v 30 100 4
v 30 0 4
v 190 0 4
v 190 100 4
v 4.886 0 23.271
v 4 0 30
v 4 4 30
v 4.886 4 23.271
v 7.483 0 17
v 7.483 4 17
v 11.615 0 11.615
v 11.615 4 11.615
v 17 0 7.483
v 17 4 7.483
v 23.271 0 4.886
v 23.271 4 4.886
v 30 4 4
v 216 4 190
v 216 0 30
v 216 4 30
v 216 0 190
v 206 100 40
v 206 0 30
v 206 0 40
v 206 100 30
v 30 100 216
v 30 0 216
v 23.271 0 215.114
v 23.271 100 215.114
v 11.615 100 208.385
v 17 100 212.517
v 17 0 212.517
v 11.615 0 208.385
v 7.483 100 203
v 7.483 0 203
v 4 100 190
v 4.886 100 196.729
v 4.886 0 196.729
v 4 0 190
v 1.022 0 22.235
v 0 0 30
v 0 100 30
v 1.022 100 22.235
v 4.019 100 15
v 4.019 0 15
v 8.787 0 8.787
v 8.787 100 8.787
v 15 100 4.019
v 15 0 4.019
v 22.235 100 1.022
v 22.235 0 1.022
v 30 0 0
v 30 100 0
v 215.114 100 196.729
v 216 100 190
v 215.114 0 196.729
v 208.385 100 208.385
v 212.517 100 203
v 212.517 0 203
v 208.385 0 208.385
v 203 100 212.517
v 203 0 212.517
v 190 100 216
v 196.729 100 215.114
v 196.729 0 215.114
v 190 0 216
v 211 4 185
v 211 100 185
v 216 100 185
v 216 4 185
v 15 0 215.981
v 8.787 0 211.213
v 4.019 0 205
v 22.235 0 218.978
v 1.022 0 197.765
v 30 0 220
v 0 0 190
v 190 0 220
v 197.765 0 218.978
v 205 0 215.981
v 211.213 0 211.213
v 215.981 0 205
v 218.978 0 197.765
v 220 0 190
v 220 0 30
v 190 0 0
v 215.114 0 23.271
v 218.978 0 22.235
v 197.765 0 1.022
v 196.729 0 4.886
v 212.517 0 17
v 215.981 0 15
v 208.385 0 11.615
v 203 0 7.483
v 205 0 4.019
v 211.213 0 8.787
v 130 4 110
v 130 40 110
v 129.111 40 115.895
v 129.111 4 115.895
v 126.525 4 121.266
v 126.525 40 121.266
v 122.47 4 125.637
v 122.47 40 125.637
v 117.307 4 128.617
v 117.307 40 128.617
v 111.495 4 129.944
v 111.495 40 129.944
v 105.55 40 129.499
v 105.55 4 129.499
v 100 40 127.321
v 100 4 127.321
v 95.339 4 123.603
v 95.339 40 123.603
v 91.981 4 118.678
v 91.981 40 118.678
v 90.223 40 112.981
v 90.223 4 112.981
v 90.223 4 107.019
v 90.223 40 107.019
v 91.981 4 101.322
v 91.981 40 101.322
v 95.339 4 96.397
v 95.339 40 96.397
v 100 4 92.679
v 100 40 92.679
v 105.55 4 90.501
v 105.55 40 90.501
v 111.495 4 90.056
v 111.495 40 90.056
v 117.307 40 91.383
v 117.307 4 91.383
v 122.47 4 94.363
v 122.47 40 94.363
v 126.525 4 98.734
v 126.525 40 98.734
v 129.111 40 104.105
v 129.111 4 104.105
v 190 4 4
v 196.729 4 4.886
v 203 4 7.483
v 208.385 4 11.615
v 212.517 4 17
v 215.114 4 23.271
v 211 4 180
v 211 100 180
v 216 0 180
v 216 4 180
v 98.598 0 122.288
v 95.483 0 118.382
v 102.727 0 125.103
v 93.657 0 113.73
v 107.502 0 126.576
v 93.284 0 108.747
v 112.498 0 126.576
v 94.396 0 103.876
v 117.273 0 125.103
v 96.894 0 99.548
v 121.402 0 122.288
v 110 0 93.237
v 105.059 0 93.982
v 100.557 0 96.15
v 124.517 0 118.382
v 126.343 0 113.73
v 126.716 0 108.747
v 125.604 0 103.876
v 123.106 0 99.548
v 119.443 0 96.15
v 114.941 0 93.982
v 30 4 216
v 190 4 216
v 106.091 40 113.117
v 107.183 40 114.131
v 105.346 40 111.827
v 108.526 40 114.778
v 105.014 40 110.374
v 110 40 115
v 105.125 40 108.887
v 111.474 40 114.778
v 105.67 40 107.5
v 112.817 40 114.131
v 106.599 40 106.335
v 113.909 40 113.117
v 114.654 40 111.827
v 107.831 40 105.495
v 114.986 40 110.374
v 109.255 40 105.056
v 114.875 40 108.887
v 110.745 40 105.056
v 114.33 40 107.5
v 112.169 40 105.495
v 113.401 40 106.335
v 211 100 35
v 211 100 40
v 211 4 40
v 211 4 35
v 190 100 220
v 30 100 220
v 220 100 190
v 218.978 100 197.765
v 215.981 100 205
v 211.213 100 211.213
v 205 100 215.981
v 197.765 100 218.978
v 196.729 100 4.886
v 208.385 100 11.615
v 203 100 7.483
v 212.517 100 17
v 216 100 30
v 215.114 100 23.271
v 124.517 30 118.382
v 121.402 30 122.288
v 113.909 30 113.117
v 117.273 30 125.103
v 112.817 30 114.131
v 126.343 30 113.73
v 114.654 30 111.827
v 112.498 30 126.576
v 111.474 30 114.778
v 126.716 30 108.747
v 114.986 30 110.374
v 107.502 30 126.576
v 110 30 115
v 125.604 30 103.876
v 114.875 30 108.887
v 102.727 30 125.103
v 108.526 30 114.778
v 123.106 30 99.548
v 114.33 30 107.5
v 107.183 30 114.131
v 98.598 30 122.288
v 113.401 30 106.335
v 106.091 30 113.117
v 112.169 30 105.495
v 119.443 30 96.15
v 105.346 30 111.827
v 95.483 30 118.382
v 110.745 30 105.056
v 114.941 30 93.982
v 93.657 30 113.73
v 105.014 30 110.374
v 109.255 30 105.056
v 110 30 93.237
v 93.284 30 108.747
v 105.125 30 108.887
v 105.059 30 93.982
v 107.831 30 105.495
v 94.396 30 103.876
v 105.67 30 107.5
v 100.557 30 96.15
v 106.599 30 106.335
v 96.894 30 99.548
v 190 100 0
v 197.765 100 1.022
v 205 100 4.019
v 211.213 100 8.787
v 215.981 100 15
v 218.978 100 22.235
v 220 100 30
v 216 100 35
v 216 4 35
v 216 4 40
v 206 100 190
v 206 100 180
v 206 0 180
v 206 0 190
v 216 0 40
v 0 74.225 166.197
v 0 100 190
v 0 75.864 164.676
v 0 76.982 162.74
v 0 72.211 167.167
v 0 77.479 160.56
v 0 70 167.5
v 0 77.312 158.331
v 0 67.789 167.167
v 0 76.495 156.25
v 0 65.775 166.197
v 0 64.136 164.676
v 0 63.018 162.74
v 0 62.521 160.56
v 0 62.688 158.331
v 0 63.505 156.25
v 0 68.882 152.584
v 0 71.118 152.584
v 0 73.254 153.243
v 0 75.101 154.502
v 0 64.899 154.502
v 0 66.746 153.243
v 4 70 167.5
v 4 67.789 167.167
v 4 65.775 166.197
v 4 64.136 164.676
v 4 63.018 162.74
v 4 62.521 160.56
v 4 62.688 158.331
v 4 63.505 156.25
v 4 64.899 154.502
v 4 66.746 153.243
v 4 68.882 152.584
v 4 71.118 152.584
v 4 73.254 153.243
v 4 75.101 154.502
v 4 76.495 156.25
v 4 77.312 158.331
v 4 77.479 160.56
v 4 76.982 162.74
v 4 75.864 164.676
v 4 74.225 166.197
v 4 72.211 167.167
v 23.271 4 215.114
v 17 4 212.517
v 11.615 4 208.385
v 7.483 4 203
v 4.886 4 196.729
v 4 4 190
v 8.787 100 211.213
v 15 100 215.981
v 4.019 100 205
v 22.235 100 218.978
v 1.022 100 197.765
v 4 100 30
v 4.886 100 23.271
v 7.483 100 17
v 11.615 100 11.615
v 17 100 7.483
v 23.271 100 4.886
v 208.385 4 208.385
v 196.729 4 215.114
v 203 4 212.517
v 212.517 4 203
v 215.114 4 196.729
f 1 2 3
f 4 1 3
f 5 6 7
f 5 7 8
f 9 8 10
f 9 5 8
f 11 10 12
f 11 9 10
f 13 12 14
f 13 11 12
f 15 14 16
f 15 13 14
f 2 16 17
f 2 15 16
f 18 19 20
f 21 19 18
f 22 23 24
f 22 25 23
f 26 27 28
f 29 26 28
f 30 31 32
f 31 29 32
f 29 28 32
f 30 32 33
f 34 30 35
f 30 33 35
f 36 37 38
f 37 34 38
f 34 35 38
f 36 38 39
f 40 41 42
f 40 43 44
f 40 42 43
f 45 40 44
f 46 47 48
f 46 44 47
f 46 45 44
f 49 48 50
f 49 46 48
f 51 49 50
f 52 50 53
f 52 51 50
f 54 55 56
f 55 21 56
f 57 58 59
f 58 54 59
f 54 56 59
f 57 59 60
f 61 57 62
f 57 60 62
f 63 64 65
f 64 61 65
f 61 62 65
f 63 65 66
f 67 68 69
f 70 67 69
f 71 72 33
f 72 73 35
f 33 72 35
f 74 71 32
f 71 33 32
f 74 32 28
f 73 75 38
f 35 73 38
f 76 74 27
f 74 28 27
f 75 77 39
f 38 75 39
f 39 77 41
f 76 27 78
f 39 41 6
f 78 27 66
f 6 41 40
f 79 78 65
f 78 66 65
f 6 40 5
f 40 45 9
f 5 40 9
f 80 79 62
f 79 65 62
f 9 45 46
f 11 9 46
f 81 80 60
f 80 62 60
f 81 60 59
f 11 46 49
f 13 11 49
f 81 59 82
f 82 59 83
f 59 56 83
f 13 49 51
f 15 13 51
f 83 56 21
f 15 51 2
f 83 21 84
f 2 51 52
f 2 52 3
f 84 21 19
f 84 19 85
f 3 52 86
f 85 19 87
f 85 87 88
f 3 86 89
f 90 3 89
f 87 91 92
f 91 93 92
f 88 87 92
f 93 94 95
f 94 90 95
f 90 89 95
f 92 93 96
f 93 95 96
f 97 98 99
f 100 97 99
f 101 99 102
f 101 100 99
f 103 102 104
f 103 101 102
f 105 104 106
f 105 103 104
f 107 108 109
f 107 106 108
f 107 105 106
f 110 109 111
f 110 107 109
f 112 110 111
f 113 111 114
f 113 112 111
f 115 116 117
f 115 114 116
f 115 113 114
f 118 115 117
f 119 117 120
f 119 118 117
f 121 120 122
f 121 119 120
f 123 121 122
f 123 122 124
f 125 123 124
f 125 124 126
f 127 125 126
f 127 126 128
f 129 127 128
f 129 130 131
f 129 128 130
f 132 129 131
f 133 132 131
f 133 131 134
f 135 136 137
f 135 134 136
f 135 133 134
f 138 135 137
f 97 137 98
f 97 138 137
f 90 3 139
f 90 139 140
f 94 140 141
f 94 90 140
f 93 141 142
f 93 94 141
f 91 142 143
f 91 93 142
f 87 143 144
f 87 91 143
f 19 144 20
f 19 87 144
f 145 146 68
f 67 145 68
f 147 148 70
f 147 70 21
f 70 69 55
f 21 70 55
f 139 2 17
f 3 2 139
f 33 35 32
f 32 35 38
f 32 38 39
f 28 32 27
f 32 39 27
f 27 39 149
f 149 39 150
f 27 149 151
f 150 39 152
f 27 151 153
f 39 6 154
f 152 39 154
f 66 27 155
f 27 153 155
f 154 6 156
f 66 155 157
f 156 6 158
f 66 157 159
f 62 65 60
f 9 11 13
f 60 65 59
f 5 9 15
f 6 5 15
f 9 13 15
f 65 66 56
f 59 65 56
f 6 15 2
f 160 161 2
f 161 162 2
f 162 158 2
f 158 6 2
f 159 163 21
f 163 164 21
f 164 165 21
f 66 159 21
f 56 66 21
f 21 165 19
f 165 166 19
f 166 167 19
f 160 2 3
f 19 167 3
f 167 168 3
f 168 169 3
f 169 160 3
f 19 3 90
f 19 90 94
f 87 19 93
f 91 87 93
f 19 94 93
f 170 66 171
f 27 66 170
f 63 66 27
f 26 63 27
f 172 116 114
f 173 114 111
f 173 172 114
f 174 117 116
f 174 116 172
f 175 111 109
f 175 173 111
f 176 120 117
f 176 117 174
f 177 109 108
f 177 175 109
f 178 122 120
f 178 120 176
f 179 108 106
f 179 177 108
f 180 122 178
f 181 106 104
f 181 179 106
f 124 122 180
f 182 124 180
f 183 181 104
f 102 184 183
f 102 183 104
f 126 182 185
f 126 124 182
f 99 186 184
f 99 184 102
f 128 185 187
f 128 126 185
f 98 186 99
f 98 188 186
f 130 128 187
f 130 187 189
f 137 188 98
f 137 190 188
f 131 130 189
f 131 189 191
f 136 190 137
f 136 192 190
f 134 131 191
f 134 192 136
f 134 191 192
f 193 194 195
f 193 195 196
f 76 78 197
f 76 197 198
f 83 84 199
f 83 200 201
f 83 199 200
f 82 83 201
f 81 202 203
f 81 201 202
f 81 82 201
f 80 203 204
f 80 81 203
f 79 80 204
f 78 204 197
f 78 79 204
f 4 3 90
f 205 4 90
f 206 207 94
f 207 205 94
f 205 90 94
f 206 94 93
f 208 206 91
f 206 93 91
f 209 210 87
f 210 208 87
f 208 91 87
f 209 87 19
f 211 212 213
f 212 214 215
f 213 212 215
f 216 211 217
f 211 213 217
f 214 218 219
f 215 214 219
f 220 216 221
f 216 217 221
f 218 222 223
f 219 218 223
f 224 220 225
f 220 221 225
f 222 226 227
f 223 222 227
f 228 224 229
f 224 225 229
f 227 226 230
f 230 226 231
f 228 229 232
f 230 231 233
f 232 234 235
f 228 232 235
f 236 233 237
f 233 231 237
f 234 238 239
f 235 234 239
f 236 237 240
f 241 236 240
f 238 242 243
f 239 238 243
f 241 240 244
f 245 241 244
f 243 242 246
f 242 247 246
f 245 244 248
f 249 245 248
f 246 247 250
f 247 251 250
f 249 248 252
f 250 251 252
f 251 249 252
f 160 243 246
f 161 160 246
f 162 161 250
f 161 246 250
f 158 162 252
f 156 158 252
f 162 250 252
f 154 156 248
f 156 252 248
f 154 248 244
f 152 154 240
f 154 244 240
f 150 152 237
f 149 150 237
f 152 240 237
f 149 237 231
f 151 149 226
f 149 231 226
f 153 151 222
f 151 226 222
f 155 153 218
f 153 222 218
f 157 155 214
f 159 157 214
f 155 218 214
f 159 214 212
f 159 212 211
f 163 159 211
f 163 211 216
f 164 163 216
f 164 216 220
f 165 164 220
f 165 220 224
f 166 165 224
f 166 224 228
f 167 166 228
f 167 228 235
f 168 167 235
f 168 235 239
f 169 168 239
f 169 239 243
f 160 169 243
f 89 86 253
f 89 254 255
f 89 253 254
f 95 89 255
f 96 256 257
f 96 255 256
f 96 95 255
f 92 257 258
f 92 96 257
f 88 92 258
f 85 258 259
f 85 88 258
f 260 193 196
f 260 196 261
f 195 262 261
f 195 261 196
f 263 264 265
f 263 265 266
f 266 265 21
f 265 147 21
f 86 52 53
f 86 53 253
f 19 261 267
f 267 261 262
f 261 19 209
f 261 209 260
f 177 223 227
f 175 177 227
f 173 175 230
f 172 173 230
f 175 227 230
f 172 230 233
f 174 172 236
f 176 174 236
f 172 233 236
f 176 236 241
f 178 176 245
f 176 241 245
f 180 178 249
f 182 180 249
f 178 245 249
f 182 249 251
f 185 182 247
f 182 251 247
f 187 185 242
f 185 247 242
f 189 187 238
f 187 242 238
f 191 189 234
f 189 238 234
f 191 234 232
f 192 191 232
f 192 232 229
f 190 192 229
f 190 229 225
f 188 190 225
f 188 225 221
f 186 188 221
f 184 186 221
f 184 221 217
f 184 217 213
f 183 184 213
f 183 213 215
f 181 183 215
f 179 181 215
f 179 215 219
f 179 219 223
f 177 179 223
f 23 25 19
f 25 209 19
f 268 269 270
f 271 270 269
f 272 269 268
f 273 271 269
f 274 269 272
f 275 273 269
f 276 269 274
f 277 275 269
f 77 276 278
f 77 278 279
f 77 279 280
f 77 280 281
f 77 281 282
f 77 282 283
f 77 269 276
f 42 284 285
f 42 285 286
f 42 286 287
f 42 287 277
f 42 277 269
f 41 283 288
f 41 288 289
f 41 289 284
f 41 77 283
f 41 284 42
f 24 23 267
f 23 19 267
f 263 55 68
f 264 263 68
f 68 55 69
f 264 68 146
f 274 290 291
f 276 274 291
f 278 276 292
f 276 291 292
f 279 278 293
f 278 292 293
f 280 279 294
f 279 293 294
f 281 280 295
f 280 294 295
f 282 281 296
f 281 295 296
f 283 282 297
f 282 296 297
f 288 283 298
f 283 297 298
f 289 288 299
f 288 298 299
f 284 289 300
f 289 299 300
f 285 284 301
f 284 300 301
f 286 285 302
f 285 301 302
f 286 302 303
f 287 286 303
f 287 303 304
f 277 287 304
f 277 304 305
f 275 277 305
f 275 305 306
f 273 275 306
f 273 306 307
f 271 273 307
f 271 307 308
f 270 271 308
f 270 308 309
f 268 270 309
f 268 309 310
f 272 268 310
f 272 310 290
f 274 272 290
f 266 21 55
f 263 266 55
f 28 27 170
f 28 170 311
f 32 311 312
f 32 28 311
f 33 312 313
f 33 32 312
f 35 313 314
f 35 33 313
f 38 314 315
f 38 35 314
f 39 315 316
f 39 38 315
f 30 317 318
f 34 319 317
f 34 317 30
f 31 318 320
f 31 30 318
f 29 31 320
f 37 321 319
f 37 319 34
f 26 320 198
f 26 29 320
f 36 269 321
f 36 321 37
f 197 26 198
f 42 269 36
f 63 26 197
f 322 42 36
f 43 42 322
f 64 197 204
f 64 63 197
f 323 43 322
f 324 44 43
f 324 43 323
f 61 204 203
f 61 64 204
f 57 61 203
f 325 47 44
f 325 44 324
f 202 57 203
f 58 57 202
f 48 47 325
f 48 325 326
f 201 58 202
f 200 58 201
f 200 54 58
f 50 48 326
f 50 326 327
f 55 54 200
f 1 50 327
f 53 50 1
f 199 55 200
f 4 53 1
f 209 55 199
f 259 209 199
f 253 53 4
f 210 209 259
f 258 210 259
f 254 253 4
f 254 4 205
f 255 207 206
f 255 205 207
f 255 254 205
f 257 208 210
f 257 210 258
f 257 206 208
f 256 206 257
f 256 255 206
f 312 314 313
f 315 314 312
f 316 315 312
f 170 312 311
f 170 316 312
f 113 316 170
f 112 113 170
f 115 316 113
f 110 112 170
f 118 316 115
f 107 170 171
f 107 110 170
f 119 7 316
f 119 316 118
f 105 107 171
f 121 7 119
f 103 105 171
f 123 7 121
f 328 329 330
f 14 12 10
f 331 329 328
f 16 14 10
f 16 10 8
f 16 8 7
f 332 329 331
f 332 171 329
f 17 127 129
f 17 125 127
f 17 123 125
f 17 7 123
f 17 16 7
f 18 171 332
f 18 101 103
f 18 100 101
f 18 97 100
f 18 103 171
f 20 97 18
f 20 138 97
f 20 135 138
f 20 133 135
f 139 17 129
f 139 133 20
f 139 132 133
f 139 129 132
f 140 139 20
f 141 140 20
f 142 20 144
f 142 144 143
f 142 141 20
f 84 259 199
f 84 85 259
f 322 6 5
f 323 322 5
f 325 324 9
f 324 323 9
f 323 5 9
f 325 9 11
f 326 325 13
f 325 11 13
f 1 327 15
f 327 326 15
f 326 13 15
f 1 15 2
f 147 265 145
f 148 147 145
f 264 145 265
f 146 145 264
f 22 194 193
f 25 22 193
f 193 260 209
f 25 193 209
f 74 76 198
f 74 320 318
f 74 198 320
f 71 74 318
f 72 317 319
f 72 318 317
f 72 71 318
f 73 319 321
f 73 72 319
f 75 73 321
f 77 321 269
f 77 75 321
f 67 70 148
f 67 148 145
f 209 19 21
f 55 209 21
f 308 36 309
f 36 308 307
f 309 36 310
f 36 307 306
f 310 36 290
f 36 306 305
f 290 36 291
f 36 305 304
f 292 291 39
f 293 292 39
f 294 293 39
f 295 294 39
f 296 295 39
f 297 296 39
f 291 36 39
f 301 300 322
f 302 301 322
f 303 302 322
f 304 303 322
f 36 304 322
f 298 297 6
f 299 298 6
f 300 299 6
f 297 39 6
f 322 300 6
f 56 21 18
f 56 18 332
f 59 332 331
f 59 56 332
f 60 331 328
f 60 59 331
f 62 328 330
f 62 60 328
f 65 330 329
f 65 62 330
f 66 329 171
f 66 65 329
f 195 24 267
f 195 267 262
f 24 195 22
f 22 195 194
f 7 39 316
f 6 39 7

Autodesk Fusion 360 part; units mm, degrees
sketch "Sketch1" plane through (0, 0, 0) normal (0, 1, 0) x (1, 0, 0)
  line L0 (30, 0) -> (190, 0)
  line L1 (220, -30) -> (220, -190)
  line L2 (190, -220) -> (30, -220)
  line L3 (0, -190) -> (0, -30)
  arc A0 (30, 0) -> (0, -30) centre (30, -30) ccw
  arc A1 (220, -30) -> (190, 0) centre (190, -30) ccw
  arc A2 (0, -190) -> (30, -220) centre (30, -190) ccw
  arc A3 (190, -220) -> (220, -190) centre (190, -190) ccw
  arc A4 (30, -4) -> (4, -30) centre (30, -30) ccw
  line L4 (4, -190) -> (4, -30)
  arc A5 (4, -190) -> (30, -216) centre (30, -190) ccw
  line L5 (190, -216) -> (30, -216)
  arc A6 (190, -216) -> (216, -190) centre (190, -190) ccw
  line L6 (216, -30) -> (216, -190)
  arc A7 (216, -30) -> (190, -4) centre (190, -30) ccw
  line L7 (30, -4) -> (190, -4)
  line L8 (30, -30) -> (190, -190) construction
  line L9 (30, -190) -> (190, -30) construction
  circle A8 centre (110, -110) radius 20
  point P0 (220, 0)
  point P1 (0, -220)
  dimension "d3" = 220
  dimension "d4" = 220
  dimension "d5" = 30
  dimension "d6" = 30
  dimension "d7" = 30
  dimension "d9" = 4
  dimension "d14" = 40
extrude "Extrude2" add sketch "Sketch1" along normal blind 4 contours A4 L4 A5 L5 A6 L6 A7 L7 makes body 1
extrude "Extrude1" add sketch "Sketch1" along normal blind 100 separate body contours L0 L1 L2 L3 A0 A1 A2 A3 makes body 2
extrude "Extrude3" add sketch "Sketch1" along normal blind 40 contours A8 bodies 1
hole "Hole2" at (110, 0, 110) direction (0, 1, 0) diameter 33.526 depth 30 tip angle 180 bodies 1
hole "Hole3" at (110, 40, 110) direction (0, -1, 0) diameter 10 depth 10 tip angle 180 bodies 1
sketch "Sketch3" plane through (216, 0, 0) normal (-1, 0, 0) x (0, 0, 1)
  line L0 (30, 0) -> (190, 0)
  line L1 (190, 0) -> (190, 100)
  line L2 (190, 100) -> (30, 100)
  line L3 (30, 100) -> (30, 0)
  line L4 (30, 0) -> (40, 0)
  line L5 (40, 0) -> (40, 100)
  line L6 (40, 100) -> (30, 100)
  line L7 (30, 100) -> (30, 0)
  line L8 (190, 0) -> (180, 0)
  line L9 (180, 0) -> (180, 100)
  line L10 (180, 100) -> (190, 100)
  line L11 (190, 100) -> (190, 0)
  dimension "d29" = 10
  dimension "d30" = 10
extrude "Extrude1'" add sketch "Sketch3" along normal blind 10 separate body contours L0 L2 L3 L4 L5 L6 L7 | L0 L1 L2 L8 L9 L10 L11 makes body 3 at (212.6667, 66.6667, 30) makes body 4 at (216, 66.6667, 183.3333) in component "circuitBoard"
sketch "Sketch4" plane through (0, 100, 0) normal (0, 1, 0) x (-1, 0, 0)
  line L0 (-216, 40) -> (-216, 30)
  line L1 (-216, 30) -> (-206, 30)
  line L2 (-206, 30) -> (-206, 40)
  line L3 (-206, 40) -> (-216, 40)
  line L4 (-216, 40) -> (-211, 40)
  line L5 (-211, 40) -> (-211, 35)
  line L6 (-211, 35) -> (-216, 35)
  line L7 (-216, 35) -> (-216, 40)
sketch "Sketch5" plane through (0, 100, 0) normal (0, 1, 0) x (-1, 0, 0)
  line L0 (-216, 190) -> (-216, 180)
  line L1 (-216, 180) -> (-206, 180)
  line L2 (-206, 180) -> (-206, 190)
  line L3 (-206, 190) -> (-216, 190)
  line L4 (-216, 180) -> (-211, 180)
  line L5 (-211, 180) -> (-211, 185)
  line L6 (-211, 185) -> (-216, 185)
  line L7 (-216, 185) -> (-216, 180)
  dimension "d33" = 5
  dimension "d34" = 5
extrude "Extrude2'" cut sketch "Sketch4" sketch "Sketch5" against normal blind 96 contours L0 L3 L4 L5 L6 L7 of sketch 2 contours L0 L1 L4 L5 L6 L7 bodies 3 4 in component "circuitBoard"
sketch "Sketch6" plane through (0, 0, 0) normal (-1, 0, 0) x (0, 0, 1)
  line L0 (30, 0) -> (190, 0)
  line L1 (190, 0) -> (190, 100)
  line L2 (190, 100) -> (30, 100)
  line L3 (30, 100) -> (30, 0)
  point P0 (160, 70)
  dimension "d39" = 30
  dimension "d40" = 30
hole "Hole4" at (0, 70, 160) direction (1, 0, 0) diameter 15 depth 10 tip angle 180 bodies 2
component "circuitBoard" placed x (1, 0, 0) y (0, 1, 0) z (0, 0, 1) at (0, 0, 0)
equation "side = 220 mm"
equation "for = 30 mm"
equation "d3 = side"
equation "d4 = side"
equation "d5 = for"
equation "d6 = for"
equation "d7 = for"
equation "d9 = Linear Dimension-4"
equation "br = 40 mm"
equation "d14 = br"
equation "bsl = 40 mm"
equation "d18 = bsl"
equation "wes = 30 mm"
equation "wet = 30 mm"
equation "d39 = wet"
equation "d40 = wes"
